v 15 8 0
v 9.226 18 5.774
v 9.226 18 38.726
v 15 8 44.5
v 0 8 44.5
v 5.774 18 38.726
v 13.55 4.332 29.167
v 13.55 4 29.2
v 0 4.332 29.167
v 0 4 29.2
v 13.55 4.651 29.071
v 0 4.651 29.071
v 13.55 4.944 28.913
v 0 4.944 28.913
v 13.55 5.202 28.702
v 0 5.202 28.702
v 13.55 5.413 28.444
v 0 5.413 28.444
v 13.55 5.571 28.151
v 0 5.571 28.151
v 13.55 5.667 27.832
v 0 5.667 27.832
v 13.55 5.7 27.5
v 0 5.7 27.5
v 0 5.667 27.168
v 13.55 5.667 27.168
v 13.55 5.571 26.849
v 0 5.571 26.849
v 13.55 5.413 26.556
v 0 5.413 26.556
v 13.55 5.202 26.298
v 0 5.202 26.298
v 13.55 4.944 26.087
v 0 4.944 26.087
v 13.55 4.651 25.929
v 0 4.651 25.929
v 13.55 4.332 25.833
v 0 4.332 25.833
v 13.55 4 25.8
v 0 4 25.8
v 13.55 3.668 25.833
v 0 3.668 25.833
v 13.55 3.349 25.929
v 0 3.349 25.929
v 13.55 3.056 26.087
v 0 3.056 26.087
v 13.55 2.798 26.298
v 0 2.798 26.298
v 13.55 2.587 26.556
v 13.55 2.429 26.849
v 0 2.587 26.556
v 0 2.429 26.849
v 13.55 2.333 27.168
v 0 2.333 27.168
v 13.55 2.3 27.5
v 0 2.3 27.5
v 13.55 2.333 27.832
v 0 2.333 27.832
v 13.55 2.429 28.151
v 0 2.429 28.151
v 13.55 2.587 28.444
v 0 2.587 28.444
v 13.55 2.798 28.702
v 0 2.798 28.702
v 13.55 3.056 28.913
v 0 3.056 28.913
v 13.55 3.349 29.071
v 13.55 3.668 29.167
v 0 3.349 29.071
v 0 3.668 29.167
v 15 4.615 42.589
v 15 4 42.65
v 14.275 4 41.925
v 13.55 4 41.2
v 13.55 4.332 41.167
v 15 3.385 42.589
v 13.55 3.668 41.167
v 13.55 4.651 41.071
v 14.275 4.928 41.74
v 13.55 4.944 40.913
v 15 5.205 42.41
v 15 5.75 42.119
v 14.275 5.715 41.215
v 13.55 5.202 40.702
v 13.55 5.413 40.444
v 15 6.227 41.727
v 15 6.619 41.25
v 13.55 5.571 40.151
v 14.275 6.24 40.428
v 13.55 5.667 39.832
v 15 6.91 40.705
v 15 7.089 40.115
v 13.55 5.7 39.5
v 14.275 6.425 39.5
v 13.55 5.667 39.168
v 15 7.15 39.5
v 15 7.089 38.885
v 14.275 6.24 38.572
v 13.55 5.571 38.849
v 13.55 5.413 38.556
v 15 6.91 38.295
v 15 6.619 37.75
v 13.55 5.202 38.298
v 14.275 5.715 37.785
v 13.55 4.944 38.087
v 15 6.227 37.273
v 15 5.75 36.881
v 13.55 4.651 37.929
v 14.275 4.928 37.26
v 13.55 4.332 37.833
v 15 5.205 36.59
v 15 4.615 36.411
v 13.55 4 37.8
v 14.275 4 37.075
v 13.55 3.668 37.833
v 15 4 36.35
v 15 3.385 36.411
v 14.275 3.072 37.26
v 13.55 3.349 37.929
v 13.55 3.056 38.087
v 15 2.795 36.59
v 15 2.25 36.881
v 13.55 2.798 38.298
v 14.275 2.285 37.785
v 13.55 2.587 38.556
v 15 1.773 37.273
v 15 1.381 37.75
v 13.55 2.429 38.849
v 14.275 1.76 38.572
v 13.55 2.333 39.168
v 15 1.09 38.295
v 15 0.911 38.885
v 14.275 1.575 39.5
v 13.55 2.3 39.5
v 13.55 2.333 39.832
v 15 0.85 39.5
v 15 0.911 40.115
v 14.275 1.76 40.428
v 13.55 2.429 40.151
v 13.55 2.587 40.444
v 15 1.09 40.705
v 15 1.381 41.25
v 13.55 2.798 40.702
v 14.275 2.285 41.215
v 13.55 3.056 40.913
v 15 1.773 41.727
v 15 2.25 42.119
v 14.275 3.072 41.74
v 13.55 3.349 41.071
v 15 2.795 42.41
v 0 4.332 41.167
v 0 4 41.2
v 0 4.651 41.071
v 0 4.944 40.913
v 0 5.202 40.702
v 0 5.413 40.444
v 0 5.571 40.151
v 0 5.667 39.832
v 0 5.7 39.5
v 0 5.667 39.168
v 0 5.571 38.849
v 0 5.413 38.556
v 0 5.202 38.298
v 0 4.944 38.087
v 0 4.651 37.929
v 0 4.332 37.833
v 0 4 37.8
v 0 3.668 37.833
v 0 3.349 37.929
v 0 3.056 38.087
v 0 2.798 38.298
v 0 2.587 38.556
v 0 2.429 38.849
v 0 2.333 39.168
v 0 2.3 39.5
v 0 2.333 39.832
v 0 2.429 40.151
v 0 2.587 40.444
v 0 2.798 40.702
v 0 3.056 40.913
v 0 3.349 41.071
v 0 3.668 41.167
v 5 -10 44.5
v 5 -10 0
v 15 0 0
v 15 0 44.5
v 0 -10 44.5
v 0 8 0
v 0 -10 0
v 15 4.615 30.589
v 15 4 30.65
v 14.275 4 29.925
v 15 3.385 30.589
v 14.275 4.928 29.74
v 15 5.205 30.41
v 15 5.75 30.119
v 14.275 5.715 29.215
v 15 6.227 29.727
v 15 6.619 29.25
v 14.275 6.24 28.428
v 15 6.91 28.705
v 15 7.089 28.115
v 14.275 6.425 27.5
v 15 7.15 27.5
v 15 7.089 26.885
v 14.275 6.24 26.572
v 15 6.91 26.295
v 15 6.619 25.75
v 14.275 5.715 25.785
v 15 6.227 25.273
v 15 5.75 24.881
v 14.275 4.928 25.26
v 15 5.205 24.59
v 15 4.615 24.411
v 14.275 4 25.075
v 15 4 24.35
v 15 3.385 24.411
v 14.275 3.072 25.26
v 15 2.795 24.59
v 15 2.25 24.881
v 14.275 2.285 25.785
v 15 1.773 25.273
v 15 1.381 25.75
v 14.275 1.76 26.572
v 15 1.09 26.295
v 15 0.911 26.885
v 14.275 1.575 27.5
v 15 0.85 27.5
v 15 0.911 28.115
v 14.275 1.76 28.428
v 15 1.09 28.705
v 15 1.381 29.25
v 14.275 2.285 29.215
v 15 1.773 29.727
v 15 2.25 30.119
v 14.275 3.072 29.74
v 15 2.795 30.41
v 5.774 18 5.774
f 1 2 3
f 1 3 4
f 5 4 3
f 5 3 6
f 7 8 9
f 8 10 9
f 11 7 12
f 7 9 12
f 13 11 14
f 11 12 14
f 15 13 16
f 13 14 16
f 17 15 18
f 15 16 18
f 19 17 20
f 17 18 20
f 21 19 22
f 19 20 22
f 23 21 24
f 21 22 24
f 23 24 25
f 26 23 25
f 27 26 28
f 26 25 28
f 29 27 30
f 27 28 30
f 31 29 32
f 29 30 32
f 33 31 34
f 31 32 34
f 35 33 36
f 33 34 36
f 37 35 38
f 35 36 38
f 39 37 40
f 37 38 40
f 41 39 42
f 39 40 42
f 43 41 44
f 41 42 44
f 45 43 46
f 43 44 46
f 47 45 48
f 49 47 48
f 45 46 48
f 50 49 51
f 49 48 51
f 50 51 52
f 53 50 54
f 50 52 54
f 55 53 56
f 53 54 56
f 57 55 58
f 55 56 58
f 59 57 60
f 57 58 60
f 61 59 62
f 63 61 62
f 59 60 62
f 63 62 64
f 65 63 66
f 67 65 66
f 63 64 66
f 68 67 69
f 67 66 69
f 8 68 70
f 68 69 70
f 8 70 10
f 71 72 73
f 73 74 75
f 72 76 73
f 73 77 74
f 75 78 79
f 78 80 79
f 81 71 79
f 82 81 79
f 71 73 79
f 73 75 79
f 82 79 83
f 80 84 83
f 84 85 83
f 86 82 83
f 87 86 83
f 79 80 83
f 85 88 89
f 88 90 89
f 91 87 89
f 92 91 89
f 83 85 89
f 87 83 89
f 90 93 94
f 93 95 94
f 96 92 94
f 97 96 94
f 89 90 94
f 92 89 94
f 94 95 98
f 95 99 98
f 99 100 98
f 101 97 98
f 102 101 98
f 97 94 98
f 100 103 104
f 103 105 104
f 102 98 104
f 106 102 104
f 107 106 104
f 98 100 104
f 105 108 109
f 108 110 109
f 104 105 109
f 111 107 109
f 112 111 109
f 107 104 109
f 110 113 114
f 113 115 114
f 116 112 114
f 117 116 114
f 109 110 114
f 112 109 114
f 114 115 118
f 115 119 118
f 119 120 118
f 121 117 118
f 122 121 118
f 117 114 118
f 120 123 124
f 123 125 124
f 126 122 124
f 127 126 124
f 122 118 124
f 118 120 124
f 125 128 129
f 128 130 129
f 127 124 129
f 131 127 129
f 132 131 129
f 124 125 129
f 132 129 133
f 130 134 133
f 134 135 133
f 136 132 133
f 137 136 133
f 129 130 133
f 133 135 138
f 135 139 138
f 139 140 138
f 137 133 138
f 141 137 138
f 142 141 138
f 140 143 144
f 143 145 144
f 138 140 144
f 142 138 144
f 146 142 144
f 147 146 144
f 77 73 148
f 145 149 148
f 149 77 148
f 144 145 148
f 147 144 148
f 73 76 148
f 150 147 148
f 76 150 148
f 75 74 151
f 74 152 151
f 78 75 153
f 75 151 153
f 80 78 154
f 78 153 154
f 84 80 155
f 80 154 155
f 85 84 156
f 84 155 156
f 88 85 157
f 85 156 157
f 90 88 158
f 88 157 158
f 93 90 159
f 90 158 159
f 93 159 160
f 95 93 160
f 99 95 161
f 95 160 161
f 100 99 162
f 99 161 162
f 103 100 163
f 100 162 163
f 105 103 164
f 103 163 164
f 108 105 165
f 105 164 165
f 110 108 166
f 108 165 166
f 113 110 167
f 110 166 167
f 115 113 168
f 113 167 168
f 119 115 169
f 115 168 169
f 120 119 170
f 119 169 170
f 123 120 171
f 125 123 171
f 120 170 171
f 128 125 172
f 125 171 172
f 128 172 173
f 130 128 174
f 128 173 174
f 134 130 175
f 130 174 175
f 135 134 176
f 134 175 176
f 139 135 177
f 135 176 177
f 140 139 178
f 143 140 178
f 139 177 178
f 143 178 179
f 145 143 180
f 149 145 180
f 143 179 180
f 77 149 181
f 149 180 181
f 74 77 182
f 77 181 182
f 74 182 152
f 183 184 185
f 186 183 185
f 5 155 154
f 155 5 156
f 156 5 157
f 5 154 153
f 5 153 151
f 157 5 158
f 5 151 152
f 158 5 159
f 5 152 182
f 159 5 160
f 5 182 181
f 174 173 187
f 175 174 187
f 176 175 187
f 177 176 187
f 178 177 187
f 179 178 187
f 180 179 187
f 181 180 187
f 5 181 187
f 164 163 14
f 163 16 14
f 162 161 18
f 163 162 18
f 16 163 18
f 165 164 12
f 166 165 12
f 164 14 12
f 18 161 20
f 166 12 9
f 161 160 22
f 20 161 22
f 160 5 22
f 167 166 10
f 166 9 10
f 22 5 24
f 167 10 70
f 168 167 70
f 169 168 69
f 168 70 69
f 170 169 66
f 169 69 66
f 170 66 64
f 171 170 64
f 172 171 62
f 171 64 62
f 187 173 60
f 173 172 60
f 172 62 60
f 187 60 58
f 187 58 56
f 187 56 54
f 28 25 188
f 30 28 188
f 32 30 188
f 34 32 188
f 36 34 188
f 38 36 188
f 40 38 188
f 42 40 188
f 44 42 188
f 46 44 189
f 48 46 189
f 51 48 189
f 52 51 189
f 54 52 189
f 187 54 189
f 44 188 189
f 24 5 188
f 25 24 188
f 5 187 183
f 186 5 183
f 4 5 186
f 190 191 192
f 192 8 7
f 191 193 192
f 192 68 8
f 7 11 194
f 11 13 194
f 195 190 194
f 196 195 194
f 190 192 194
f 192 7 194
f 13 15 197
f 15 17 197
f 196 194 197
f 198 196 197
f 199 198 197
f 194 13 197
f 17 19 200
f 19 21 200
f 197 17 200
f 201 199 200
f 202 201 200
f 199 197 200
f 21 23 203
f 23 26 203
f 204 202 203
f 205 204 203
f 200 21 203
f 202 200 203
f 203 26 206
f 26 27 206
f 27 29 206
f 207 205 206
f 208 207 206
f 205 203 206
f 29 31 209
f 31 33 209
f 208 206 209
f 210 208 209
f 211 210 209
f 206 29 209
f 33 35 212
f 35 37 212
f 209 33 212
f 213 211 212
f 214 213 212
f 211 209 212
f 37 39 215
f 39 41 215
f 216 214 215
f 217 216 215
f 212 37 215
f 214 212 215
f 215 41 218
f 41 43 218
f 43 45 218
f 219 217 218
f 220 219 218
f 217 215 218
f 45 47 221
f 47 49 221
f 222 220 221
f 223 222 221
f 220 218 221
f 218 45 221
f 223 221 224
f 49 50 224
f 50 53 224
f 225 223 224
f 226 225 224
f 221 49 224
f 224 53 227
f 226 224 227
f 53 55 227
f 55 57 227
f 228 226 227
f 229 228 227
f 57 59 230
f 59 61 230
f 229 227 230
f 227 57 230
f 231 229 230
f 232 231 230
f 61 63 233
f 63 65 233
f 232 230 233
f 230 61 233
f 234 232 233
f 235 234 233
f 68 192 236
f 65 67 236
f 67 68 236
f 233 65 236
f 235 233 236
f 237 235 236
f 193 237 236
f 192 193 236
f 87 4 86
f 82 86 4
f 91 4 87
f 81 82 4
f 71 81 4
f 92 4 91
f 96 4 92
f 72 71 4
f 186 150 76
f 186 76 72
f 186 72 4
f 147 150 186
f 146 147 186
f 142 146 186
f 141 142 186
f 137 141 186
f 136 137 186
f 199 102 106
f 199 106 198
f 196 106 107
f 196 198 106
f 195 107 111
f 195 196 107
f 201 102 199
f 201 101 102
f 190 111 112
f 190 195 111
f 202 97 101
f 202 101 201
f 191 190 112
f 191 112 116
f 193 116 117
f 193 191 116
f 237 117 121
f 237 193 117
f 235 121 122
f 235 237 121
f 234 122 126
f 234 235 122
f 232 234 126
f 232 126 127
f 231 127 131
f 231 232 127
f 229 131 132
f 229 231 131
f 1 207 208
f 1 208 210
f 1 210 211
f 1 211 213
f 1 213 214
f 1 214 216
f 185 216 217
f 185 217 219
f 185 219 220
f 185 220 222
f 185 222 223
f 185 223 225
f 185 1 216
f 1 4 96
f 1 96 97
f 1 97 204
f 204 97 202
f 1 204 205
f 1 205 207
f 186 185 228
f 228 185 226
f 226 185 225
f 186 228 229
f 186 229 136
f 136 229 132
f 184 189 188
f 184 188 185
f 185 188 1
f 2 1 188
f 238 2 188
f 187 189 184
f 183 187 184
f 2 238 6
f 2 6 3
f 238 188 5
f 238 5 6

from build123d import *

# Parameters (mm, degrees)
BOSS_EXTRU_1_DEPTH                             = 44.5
ESQUISSE2_W                                    = 15
ESQUISSE2_H                                    = 11.547005384
ENL_V_MAT_EXTRU_1_DEPTH                        = 46.105349392
ESQUISSE4_W                                    = 15
ESQUISSE4_H                                    = 11.547005384
ENL_V_MAT_EXTRU_3_DEPTH                        = 53.740449787
BOSS_EXTRU_4_DEPTH                             = 44.5
FRAISAGE_POUR_VIS_T_TE_FRAIS_E_M31_D           = 3.4
FRAISAGE_POUR_VIS_T_TE_FRAIS_E_M31_CSINK_D     = 6.3
FRAISAGE_POUR_VIS_T_TE_FRAIS_E_M31_CSINK_ANGLE = 90
R_P_TITION_LIN_AIRE1_COUNT                     = 2
R_P_TITION_LIN_AIRE1_PITCH                     = 12


with BuildPart() as part:
    # Esquisse1 → Boss.-Extru.1 (new body)
    with BuildSketch(Plane.XY):
        Polygon((0, 8), (5.773502692, 18), (9.226497308, 18), (15, 8), (15, 0), (0, 0), align=None)
    extrude(amount=BOSS_EXTRU_1_DEPTH)

    # Esquisse2 → Enlèv. mat.-Extru.1 (cut, through all)
    with BuildSketch(Plane(origin=(0, 21.269065234, 36.839101615), x_dir=(-1, 0, 0), z_dir=(0, 0.500000000000001, 0.866025403784438))):
        with Locations((-7.5, 9.548294078)):
            Rectangle(ESQUISSE2_W, ESQUISSE2_H)
    extrude(amount=ENL_V_MAT_EXTRU_1_DEPTH, mode=Mode.SUBTRACT)

    # Esquisse4 → Enlèv. mat.-Extru.3 (cut, through all)
    with BuildSketch(Plane(origin=(0, 2, -3.464101615), x_dir=(-1, 0, 0), z_dir=(0, 0.500000000000001, -0.866025403784438))):
        with Locations((-7.5, 12.701705922)):
            Rectangle(ESQUISSE4_W, ESQUISSE4_H)
    extrude(amount=ENL_V_MAT_EXTRU_3_DEPTH, mode=Mode.SUBTRACT)

    # Esquisse5 → Boss.-Extru.4 (add)
    with BuildSketch(Plane.XY):
        Polygon((0, -10), (5, -10), (15, 0), (0, 0), align=None)
    extrude(amount=BOSS_EXTRU_4_DEPTH)

    # Fraisage pour vis à tête fraisée M31 (through all)
    with Locations(Plane(origin=(15, 0, 0), x_dir=(0, 0, -1), z_dir=(1, 0, 0))):
        with Locations((-39.5, 4)):
            fraisage_pour_vis_t_te_frais_e_m31 = CounterSinkHole(FRAISAGE_POUR_VIS_T_TE_FRAIS_E_M31_D / 2, FRAISAGE_POUR_VIS_T_TE_FRAIS_E_M31_CSINK_D / 2, counter_sink_angle=FRAISAGE_POUR_VIS_T_TE_FRAIS_E_M31_CSINK_ANGLE)

    # Répétition linéaire1: Fraisage pour vis à tête fraisée M31 ×2
    with Locations(*[(0, 0, -i * R_P_TITION_LIN_AIRE1_PITCH) for i in range(1, R_P_TITION_LIN_AIRE1_COUNT)]):
        add(fraisage_pour_vis_t_te_frais_e_m31, mode=Mode.SUBTRACT)


solid = part.part
